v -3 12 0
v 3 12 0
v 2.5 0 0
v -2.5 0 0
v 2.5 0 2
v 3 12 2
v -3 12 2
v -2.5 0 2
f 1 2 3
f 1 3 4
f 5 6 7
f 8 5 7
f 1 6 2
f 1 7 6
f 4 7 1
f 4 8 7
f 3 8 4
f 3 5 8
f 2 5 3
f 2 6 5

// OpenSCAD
leg_bottom_width = 5;
leg_top_width = 6;
leg_height = 12;
leg_thickness = 2;

module polygon_leg(
    bottom_width = leg_bottom_width,
    top_width = leg_top_width,
    height = leg_height,
    thickness = leg_thickness
) {
    linear_extrude(height = thickness) {
        polygon(points = [
            [-bottom_width / 2, 0],
            [bottom_width / 2, 0],
            [top_width / 2, height],
            [-top_width / 2, height]
        ]);
    }
}

polygon_leg();
